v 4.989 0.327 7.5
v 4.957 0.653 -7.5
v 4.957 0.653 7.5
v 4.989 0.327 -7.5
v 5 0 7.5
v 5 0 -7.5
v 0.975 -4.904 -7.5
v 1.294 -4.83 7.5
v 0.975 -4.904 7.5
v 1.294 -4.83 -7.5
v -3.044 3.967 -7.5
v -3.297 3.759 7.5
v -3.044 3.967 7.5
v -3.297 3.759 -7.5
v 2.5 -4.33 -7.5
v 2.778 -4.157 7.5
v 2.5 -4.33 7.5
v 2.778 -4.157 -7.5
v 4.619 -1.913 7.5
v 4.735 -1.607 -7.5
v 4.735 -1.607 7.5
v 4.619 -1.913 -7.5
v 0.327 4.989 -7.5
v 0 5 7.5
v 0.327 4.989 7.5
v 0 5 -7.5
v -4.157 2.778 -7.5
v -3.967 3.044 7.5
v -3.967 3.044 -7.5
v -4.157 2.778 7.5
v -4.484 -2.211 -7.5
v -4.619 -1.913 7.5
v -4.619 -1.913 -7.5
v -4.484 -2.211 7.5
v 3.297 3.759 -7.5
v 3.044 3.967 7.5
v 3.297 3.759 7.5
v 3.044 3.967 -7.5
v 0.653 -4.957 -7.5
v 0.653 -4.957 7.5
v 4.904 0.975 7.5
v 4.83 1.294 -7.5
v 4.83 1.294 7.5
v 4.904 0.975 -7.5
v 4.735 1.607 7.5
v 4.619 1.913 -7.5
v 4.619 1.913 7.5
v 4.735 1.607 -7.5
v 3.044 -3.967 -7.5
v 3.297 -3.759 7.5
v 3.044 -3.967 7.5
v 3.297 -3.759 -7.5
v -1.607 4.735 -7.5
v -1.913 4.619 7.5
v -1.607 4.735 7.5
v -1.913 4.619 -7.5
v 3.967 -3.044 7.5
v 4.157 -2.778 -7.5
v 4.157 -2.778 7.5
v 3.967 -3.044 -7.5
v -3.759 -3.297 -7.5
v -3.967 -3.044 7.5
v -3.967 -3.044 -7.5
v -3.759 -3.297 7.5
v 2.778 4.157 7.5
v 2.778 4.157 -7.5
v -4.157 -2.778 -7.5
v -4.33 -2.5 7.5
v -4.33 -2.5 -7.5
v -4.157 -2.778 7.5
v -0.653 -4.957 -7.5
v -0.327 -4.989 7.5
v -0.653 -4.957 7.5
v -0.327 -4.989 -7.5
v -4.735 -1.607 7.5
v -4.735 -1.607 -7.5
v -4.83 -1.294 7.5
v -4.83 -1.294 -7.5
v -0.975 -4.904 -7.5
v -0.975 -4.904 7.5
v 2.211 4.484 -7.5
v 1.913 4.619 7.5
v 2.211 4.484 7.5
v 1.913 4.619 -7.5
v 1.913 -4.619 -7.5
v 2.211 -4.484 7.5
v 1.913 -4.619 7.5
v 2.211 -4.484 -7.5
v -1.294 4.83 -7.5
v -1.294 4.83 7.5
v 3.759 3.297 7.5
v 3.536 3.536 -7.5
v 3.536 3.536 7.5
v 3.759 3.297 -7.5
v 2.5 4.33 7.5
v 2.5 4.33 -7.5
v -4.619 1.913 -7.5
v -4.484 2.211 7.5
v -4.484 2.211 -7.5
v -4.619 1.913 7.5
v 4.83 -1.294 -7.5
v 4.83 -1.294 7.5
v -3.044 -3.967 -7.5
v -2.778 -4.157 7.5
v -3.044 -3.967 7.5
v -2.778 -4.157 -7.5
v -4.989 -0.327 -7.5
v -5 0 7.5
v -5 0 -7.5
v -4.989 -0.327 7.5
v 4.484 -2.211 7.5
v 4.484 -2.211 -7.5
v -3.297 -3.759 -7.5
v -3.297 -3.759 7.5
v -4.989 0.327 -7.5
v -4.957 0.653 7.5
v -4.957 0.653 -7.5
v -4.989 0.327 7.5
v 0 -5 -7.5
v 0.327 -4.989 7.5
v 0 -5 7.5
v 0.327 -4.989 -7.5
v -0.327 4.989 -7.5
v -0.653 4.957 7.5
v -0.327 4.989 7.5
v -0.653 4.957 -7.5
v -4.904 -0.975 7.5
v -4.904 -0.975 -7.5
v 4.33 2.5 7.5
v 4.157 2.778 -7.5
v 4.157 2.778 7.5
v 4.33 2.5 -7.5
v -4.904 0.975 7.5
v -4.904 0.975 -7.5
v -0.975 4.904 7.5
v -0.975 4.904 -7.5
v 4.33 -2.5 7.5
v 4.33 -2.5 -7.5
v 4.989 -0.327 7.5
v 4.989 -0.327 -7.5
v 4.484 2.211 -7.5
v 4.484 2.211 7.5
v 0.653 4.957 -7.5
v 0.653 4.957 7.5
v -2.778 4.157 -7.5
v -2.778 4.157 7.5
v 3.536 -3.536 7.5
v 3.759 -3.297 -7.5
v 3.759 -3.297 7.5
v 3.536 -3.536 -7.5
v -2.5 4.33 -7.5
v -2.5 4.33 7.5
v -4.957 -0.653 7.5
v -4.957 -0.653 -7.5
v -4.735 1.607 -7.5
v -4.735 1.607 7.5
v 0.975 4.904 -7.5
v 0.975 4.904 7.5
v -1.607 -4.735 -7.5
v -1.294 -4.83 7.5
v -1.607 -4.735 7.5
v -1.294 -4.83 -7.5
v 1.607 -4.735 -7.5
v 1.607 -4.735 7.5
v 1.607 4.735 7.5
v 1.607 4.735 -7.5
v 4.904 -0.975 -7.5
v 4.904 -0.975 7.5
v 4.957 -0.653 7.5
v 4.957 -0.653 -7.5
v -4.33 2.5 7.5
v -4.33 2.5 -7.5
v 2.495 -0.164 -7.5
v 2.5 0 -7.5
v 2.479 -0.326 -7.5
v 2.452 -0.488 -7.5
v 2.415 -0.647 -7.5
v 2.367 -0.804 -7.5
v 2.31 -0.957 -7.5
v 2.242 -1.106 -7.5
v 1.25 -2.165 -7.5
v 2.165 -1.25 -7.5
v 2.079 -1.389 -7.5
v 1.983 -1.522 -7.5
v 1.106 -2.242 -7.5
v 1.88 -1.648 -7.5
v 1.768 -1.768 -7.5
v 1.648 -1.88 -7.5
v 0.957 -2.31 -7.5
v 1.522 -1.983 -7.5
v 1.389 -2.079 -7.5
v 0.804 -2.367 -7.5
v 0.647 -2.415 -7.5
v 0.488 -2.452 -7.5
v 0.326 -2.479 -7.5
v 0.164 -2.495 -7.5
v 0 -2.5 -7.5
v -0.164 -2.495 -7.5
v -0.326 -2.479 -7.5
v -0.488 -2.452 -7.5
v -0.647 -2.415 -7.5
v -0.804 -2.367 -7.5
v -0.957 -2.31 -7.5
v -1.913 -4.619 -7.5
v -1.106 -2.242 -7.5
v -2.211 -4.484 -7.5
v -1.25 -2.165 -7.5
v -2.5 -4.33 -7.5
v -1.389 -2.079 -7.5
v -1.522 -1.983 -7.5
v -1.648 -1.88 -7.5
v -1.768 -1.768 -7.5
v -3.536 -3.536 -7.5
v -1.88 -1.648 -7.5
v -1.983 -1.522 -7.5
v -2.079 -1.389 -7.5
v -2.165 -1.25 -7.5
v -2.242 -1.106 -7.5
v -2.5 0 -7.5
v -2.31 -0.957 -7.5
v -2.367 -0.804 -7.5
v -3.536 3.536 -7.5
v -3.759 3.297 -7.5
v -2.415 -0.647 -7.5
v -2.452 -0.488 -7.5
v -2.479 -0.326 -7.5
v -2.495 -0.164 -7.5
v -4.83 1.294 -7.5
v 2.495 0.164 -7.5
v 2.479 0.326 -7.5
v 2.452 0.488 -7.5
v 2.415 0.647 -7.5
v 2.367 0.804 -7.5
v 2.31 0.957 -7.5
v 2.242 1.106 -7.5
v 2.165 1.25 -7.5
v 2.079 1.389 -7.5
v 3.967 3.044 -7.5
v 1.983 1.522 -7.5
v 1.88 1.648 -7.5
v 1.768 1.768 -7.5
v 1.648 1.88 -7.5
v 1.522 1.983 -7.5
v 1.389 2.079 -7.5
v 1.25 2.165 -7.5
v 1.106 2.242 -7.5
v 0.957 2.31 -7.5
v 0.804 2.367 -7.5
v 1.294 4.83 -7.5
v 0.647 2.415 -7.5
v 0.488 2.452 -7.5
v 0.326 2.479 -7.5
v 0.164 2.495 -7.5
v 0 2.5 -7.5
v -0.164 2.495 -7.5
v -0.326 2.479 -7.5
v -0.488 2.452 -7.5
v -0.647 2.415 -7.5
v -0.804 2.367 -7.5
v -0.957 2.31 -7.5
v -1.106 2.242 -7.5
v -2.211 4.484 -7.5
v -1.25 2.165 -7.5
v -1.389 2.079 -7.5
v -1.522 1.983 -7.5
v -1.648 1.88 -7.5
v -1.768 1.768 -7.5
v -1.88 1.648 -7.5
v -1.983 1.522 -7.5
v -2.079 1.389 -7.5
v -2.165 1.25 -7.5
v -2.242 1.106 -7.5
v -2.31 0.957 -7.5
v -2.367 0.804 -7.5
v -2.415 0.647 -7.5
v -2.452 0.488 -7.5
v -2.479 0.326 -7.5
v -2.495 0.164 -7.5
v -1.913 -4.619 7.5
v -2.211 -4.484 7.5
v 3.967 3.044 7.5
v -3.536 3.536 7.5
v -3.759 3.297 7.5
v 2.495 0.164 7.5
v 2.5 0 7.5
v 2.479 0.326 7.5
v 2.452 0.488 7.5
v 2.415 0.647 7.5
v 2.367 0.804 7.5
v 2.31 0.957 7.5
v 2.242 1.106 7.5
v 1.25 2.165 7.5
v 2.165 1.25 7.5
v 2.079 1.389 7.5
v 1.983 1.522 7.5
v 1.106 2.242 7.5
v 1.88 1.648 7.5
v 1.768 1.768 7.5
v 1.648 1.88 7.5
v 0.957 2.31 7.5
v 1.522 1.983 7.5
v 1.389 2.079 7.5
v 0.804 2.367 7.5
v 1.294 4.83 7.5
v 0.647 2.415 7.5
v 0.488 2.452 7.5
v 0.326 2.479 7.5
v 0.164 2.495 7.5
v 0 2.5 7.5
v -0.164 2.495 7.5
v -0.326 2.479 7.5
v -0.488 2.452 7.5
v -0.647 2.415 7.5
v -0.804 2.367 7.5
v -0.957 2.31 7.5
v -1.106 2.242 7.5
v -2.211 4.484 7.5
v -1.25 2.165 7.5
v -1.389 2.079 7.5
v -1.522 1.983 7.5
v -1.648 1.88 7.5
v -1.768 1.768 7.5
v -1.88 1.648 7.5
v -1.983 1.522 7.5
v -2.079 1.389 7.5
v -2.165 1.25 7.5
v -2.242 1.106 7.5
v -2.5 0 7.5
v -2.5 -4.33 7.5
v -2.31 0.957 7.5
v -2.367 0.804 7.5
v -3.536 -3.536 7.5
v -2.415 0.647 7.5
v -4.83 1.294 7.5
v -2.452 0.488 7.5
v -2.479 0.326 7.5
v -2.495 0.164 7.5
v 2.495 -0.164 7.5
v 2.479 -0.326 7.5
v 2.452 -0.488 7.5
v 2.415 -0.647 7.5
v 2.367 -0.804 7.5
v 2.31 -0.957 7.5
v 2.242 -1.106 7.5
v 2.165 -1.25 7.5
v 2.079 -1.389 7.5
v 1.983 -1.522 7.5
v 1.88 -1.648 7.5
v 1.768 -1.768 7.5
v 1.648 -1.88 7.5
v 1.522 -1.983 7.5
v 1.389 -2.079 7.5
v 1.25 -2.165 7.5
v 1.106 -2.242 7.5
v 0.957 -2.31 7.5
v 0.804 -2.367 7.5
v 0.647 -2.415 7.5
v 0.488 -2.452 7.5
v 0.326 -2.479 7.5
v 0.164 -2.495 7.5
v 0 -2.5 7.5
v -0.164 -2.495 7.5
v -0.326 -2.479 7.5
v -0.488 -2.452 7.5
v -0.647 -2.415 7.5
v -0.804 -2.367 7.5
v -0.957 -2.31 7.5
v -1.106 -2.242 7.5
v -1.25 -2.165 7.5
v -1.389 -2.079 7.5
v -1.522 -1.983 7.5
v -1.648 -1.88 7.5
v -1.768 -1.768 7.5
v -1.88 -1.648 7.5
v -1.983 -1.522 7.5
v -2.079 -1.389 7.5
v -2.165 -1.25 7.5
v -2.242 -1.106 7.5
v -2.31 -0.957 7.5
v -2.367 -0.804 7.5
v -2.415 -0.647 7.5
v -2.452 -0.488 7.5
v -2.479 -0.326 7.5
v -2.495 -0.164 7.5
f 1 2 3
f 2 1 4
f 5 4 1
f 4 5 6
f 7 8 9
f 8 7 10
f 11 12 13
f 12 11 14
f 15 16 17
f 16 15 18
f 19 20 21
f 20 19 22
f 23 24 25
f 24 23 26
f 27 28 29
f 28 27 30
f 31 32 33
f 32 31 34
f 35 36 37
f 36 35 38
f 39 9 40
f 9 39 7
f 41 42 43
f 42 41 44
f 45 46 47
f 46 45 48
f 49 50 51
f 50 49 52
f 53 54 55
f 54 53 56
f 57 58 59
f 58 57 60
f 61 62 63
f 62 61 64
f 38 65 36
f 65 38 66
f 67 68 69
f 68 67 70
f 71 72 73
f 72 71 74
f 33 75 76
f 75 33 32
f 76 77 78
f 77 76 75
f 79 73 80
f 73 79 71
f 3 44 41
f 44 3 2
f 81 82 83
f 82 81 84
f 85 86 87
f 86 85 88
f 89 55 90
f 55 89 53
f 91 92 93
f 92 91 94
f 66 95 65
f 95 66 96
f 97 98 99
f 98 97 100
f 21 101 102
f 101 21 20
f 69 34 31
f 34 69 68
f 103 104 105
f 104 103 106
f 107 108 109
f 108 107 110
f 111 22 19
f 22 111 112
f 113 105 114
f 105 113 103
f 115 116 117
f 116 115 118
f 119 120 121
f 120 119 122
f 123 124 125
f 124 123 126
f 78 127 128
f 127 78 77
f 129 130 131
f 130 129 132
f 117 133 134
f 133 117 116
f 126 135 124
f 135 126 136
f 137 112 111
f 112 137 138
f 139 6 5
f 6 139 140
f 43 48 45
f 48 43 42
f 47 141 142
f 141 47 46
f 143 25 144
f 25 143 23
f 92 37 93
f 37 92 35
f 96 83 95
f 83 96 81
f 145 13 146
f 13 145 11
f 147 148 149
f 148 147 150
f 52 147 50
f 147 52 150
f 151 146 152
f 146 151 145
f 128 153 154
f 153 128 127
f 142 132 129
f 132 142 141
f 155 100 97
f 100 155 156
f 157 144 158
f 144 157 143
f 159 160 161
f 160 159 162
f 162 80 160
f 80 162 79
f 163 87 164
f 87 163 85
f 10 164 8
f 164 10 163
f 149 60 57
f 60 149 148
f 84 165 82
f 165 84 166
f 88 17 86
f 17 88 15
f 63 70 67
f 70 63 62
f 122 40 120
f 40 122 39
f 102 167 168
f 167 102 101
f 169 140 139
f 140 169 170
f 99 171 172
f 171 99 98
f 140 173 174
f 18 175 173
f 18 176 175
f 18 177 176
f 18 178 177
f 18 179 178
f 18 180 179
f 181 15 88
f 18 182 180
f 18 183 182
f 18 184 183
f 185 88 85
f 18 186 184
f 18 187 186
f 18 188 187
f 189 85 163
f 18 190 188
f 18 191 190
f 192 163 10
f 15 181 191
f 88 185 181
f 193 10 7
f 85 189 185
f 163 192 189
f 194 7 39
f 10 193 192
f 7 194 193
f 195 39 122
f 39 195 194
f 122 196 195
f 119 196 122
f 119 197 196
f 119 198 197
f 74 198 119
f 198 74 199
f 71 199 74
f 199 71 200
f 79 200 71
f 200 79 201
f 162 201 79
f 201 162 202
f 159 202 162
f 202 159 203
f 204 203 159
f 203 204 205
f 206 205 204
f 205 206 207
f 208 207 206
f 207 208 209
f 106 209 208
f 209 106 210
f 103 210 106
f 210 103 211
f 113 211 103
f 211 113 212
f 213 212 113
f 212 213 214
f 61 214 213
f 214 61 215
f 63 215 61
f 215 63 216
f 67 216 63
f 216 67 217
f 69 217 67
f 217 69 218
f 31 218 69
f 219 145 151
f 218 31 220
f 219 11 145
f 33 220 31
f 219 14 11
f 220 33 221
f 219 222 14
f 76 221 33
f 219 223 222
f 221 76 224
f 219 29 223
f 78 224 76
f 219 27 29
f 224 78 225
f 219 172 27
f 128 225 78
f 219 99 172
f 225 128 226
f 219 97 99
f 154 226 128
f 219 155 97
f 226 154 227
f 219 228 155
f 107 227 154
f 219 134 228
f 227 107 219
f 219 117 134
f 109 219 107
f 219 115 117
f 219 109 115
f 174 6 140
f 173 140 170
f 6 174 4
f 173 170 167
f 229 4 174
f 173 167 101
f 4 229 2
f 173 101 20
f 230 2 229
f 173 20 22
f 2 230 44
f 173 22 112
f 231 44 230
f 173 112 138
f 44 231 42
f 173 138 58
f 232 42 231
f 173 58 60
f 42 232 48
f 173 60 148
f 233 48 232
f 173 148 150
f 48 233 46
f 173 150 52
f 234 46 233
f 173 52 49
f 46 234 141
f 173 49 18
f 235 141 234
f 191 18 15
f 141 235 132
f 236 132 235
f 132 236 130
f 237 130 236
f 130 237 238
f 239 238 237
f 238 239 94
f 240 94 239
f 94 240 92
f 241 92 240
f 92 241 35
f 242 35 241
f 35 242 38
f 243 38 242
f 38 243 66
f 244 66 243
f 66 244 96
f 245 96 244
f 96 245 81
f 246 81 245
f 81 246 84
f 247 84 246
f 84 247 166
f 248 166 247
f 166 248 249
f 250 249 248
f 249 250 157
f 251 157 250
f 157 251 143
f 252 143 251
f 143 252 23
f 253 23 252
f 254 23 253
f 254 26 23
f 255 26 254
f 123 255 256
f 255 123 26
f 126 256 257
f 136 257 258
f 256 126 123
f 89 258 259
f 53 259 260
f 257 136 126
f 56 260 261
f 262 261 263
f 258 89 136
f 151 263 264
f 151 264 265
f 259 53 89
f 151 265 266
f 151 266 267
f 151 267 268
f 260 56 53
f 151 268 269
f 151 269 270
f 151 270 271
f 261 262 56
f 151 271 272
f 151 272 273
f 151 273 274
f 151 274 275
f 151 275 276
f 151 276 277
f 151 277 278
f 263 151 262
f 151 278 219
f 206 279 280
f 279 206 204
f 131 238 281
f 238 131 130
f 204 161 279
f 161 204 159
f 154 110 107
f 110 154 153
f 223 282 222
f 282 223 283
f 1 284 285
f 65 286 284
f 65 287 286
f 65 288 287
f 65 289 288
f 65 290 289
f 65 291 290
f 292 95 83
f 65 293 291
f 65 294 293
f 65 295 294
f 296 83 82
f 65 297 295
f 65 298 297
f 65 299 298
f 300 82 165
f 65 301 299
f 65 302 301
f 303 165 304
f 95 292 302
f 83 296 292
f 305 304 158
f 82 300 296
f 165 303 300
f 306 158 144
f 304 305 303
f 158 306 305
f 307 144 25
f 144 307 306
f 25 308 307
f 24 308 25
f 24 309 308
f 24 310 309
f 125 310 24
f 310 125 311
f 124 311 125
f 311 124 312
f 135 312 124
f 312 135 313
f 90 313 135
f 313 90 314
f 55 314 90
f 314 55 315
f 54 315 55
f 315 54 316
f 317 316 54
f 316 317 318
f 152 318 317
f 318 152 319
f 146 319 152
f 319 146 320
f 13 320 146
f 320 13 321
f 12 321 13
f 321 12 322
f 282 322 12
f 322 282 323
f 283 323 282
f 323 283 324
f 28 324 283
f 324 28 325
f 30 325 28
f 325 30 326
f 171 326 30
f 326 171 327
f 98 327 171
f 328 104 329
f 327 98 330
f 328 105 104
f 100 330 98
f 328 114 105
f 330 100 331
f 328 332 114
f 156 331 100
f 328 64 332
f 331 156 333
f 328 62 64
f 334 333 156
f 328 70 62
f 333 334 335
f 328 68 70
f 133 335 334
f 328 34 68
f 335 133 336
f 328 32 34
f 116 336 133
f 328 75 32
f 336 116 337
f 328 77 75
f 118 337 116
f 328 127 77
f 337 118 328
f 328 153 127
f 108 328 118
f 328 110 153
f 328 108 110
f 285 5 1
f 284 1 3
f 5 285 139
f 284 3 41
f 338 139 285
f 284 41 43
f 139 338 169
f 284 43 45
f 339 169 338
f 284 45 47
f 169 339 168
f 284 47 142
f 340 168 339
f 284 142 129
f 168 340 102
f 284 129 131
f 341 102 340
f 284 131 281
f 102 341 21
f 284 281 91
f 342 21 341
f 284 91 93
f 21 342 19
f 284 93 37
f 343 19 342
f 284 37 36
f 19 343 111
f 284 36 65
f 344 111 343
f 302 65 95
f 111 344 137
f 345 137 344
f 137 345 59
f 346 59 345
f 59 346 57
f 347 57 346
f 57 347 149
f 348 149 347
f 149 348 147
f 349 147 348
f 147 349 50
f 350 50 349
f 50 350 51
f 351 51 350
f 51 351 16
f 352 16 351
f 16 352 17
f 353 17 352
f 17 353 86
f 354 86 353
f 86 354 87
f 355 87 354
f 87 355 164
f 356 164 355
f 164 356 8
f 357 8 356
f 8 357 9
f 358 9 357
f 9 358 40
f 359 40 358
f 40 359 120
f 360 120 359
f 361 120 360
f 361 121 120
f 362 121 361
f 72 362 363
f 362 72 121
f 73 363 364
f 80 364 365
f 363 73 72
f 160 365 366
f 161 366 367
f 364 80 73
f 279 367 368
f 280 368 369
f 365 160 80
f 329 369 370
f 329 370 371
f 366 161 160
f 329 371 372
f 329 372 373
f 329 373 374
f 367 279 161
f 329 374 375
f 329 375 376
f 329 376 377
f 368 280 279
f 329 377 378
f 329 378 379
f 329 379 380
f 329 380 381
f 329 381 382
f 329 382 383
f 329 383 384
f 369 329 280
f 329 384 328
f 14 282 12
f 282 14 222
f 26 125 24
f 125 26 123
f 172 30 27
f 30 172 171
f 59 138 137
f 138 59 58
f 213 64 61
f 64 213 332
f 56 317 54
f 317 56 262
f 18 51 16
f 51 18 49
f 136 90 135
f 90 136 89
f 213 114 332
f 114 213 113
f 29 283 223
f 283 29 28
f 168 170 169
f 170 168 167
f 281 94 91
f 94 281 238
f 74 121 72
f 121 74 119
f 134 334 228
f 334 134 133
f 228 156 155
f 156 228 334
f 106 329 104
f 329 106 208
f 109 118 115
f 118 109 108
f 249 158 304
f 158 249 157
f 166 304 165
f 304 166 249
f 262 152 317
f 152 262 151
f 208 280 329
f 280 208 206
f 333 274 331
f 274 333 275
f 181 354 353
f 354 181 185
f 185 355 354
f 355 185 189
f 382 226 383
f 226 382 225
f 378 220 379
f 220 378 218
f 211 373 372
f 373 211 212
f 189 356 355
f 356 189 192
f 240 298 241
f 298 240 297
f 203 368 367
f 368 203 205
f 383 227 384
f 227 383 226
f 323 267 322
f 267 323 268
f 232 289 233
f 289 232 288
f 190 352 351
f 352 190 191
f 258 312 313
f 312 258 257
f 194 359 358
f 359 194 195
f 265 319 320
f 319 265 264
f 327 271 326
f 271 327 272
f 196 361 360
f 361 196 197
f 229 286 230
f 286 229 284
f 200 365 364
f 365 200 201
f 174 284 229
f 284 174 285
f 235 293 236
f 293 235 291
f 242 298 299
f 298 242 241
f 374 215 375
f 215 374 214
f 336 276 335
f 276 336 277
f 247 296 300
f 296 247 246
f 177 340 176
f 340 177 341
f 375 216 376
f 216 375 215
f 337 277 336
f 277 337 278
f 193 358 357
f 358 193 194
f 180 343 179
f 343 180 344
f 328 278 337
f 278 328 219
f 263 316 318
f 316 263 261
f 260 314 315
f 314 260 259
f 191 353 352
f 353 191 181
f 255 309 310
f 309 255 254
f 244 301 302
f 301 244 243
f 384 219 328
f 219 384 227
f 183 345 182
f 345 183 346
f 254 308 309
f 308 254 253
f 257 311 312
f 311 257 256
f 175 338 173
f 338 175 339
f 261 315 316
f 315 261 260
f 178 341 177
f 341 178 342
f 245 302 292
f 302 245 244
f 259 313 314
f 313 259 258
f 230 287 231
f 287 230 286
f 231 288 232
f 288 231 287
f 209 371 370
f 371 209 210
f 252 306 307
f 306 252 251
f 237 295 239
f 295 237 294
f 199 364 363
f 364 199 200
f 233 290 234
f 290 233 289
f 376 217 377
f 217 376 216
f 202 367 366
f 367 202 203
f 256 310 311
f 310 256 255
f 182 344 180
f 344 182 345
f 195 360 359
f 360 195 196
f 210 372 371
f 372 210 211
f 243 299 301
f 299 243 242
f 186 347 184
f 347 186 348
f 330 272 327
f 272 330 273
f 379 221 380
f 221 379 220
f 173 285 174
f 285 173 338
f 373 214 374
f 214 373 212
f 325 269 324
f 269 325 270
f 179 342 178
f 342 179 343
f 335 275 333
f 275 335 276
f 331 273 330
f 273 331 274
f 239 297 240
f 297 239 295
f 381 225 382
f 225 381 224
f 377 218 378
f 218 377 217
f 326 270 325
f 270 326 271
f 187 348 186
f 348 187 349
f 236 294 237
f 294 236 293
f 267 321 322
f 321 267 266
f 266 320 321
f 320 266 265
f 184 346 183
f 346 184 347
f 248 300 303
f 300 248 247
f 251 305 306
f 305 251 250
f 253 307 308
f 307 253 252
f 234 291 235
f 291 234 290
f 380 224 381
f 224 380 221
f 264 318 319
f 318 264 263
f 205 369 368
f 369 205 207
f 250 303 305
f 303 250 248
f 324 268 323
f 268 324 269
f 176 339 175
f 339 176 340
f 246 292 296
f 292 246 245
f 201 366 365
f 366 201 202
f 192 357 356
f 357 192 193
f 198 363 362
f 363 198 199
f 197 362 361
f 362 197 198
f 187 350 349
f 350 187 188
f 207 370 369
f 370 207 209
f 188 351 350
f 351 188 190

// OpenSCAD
$fn=96;

bore_d = 5.0;
od_d = 10.0;
len = 15.0;

module linear_bearing(bore_d, od_d, len){
    difference(){
        cylinder(d=od_d, h=len, center=true);
        cylinder(d=bore_d, h=len+0.2, center=true);
    }
}

linear_bearing(bore_d, od_d, len);
